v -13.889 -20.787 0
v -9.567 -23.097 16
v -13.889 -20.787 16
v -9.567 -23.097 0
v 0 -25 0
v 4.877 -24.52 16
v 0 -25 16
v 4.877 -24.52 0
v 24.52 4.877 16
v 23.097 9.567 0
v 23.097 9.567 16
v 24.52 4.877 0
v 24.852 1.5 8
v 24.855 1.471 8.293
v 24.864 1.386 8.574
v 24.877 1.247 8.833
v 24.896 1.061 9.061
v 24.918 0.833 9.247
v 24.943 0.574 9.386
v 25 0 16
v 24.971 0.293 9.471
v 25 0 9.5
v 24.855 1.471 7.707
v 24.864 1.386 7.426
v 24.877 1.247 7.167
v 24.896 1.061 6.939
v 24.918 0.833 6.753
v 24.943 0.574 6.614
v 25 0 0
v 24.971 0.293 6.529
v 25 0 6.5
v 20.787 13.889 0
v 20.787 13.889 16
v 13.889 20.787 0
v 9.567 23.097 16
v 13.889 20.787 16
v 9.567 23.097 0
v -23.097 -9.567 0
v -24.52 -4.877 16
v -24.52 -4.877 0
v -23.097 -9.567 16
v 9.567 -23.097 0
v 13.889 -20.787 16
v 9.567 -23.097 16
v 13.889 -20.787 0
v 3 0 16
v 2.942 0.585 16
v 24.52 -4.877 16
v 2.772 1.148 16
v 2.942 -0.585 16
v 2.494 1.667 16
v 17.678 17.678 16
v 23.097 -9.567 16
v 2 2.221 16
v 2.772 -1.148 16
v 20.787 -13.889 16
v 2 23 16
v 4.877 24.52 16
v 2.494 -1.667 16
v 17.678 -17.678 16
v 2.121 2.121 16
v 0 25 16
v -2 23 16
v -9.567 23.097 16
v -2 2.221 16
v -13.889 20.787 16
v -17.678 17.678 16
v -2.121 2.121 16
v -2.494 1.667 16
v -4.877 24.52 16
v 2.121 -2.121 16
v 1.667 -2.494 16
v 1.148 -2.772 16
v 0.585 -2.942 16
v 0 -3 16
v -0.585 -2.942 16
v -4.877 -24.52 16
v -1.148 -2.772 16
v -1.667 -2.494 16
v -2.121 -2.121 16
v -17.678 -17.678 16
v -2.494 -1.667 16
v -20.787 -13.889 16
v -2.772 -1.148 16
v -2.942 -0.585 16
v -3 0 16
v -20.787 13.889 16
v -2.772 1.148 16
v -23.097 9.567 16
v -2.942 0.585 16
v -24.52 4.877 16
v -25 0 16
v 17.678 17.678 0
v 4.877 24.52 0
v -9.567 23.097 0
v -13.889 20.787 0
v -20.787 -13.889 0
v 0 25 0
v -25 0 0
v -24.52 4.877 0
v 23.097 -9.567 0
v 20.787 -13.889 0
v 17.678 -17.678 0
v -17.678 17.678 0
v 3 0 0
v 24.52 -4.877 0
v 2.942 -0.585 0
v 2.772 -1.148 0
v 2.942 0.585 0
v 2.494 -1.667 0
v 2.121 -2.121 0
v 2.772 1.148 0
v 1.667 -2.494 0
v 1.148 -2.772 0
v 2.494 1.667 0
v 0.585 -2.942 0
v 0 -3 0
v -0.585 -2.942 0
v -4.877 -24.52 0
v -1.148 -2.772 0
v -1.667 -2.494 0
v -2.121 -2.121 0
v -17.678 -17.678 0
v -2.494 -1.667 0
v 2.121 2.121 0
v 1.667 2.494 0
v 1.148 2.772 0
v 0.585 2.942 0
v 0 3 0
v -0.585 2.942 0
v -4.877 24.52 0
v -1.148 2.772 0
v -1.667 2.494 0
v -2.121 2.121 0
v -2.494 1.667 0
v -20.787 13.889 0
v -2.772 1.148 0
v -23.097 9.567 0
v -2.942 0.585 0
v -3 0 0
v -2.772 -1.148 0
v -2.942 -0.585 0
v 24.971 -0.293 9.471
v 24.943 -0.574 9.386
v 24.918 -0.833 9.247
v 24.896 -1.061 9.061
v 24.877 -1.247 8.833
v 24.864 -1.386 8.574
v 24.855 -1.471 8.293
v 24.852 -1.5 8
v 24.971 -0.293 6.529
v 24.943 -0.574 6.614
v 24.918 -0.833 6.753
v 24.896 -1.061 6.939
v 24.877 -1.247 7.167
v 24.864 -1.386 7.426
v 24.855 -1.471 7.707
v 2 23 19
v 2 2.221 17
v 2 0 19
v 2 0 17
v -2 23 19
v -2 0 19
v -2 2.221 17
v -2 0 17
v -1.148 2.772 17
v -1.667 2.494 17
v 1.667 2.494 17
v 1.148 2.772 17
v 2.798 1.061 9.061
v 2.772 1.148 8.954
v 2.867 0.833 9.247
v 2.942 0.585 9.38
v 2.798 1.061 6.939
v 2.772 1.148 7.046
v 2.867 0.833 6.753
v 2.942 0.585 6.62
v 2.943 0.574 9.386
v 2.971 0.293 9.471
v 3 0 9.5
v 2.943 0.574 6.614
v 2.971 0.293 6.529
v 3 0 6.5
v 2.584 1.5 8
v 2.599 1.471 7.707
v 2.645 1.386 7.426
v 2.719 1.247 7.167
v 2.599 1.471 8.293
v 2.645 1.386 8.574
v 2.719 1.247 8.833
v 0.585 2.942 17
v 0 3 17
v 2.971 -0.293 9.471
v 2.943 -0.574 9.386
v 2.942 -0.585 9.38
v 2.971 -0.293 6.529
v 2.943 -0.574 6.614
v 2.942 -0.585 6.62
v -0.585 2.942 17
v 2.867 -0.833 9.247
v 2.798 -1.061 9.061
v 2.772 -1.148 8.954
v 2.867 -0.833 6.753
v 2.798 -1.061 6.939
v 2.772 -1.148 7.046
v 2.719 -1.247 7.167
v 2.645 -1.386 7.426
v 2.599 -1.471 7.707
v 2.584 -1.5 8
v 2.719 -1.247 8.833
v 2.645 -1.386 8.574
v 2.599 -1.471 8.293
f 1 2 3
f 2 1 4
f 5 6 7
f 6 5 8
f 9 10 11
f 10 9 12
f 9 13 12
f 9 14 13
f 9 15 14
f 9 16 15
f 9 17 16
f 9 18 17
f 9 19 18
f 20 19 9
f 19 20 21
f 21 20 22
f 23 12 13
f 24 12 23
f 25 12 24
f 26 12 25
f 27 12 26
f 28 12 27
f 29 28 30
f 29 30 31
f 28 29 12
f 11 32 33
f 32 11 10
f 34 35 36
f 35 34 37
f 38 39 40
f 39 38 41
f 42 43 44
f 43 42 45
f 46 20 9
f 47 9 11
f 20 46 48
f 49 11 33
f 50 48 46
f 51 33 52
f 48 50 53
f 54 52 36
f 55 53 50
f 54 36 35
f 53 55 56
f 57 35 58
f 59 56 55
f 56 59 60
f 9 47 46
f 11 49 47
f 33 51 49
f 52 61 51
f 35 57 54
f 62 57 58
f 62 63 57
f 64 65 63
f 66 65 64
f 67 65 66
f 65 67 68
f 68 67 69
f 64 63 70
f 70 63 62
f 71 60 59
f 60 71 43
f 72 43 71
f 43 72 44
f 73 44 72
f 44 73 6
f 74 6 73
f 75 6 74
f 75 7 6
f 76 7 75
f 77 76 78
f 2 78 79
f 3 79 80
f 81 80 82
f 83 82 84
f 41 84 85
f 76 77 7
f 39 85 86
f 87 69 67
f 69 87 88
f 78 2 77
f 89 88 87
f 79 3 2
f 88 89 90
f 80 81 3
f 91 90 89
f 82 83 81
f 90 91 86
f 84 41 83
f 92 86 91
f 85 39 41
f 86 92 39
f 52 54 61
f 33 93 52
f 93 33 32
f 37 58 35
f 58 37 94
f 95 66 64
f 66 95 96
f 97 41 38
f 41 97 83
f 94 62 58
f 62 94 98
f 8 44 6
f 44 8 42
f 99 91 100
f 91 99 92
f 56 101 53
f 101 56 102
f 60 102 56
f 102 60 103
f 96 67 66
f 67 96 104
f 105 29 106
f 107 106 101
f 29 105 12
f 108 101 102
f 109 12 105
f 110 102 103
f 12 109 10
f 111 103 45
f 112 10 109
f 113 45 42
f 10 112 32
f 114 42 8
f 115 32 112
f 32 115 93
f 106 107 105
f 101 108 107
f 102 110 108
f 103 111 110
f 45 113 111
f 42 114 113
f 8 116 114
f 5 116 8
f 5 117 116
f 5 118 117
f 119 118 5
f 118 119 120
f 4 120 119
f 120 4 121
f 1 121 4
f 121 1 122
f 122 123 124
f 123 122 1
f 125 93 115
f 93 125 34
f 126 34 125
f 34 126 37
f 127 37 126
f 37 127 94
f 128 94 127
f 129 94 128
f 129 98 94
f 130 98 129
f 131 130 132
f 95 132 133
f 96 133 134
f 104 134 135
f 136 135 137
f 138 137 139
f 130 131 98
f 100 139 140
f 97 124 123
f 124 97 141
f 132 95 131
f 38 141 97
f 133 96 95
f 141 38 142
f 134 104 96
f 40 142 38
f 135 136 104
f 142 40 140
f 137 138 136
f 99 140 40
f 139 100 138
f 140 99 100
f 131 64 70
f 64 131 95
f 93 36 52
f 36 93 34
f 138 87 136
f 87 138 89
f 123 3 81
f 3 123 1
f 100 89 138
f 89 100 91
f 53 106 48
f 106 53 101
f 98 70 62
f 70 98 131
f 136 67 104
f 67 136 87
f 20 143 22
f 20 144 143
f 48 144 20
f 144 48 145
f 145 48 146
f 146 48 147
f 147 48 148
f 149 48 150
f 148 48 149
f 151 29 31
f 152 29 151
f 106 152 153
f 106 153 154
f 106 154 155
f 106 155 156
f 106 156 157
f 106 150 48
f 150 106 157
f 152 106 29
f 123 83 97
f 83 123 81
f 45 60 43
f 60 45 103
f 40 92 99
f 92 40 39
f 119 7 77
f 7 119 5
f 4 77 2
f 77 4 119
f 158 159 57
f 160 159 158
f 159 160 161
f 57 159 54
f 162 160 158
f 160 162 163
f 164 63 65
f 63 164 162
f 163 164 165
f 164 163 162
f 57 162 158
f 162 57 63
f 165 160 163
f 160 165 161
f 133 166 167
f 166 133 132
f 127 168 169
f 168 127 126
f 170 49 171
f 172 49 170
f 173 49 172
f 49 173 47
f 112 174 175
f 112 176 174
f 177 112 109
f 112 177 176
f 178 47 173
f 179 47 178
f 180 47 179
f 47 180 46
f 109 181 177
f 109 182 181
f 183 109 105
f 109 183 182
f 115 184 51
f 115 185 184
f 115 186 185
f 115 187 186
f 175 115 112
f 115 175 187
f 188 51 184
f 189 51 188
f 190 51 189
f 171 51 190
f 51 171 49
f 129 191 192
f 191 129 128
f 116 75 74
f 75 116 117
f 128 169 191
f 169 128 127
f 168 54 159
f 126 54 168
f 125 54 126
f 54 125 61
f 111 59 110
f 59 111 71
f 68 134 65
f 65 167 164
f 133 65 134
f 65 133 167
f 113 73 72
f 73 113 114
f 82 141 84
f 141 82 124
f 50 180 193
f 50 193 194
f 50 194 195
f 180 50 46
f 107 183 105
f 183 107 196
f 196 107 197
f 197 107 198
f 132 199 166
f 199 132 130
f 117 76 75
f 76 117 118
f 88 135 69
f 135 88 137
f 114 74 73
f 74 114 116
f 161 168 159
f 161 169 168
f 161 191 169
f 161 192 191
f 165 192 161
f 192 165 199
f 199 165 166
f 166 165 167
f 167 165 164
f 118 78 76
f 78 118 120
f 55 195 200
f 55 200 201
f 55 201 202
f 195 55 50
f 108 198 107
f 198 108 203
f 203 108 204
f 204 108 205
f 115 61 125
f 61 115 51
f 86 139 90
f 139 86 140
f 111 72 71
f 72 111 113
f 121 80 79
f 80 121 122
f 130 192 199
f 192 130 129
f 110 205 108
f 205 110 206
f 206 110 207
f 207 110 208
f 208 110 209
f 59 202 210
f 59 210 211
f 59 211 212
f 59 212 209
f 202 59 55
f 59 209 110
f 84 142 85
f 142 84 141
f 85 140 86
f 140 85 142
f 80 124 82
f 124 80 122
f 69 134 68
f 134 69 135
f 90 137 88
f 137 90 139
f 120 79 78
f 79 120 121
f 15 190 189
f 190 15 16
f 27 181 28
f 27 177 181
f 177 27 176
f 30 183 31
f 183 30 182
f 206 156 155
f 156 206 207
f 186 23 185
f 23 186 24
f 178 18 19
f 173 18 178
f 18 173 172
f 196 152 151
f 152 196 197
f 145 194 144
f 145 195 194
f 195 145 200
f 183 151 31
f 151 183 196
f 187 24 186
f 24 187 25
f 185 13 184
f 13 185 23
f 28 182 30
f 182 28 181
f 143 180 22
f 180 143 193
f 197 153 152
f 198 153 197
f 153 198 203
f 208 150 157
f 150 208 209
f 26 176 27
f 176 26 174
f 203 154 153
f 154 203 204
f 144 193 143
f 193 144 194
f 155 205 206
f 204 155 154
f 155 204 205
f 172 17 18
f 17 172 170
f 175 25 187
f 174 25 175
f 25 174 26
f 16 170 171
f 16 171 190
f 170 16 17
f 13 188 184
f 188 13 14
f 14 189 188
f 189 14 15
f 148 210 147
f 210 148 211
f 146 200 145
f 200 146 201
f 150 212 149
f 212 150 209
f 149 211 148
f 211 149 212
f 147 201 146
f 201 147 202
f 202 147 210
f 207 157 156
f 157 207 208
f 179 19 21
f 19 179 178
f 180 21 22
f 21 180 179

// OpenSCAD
$fn = 32;

// ----------------------------------------------------------------------
// Control knob: pointer knob
// ----------------------------------------------------------------------

// --- parameters (mm) ---
rib_w = 4;                // pointer rib width
rib_h = 4;                // pointer rib height
knob_d = 50;              // knob body diameter
knob_h = 16;              // knob body height
bore_d = 6;               // shaft bore diameter
set_d = 3;                // set screw bore diameter

rib_poke = rib_h - 1;  // rib height above the top
total_h = knob_h + rib_h - 1;  // overall height

difference() {
  union() {
    cylinder(h = knob_h, d = knob_d);
    translate([-rib_w / 2, 0, knob_h - 1])
      cube([rib_w, knob_d / 2 - 2, rib_h]);
  }
  translate([0, 0, -1]) cylinder(h = knob_h + 2, d = bore_d);
  translate([-1, 0, knob_h / 2]) rotate([0, 90, 0])
    cylinder(h = knob_d / 2 + bore_d / 2 + 2, d = set_d);}
